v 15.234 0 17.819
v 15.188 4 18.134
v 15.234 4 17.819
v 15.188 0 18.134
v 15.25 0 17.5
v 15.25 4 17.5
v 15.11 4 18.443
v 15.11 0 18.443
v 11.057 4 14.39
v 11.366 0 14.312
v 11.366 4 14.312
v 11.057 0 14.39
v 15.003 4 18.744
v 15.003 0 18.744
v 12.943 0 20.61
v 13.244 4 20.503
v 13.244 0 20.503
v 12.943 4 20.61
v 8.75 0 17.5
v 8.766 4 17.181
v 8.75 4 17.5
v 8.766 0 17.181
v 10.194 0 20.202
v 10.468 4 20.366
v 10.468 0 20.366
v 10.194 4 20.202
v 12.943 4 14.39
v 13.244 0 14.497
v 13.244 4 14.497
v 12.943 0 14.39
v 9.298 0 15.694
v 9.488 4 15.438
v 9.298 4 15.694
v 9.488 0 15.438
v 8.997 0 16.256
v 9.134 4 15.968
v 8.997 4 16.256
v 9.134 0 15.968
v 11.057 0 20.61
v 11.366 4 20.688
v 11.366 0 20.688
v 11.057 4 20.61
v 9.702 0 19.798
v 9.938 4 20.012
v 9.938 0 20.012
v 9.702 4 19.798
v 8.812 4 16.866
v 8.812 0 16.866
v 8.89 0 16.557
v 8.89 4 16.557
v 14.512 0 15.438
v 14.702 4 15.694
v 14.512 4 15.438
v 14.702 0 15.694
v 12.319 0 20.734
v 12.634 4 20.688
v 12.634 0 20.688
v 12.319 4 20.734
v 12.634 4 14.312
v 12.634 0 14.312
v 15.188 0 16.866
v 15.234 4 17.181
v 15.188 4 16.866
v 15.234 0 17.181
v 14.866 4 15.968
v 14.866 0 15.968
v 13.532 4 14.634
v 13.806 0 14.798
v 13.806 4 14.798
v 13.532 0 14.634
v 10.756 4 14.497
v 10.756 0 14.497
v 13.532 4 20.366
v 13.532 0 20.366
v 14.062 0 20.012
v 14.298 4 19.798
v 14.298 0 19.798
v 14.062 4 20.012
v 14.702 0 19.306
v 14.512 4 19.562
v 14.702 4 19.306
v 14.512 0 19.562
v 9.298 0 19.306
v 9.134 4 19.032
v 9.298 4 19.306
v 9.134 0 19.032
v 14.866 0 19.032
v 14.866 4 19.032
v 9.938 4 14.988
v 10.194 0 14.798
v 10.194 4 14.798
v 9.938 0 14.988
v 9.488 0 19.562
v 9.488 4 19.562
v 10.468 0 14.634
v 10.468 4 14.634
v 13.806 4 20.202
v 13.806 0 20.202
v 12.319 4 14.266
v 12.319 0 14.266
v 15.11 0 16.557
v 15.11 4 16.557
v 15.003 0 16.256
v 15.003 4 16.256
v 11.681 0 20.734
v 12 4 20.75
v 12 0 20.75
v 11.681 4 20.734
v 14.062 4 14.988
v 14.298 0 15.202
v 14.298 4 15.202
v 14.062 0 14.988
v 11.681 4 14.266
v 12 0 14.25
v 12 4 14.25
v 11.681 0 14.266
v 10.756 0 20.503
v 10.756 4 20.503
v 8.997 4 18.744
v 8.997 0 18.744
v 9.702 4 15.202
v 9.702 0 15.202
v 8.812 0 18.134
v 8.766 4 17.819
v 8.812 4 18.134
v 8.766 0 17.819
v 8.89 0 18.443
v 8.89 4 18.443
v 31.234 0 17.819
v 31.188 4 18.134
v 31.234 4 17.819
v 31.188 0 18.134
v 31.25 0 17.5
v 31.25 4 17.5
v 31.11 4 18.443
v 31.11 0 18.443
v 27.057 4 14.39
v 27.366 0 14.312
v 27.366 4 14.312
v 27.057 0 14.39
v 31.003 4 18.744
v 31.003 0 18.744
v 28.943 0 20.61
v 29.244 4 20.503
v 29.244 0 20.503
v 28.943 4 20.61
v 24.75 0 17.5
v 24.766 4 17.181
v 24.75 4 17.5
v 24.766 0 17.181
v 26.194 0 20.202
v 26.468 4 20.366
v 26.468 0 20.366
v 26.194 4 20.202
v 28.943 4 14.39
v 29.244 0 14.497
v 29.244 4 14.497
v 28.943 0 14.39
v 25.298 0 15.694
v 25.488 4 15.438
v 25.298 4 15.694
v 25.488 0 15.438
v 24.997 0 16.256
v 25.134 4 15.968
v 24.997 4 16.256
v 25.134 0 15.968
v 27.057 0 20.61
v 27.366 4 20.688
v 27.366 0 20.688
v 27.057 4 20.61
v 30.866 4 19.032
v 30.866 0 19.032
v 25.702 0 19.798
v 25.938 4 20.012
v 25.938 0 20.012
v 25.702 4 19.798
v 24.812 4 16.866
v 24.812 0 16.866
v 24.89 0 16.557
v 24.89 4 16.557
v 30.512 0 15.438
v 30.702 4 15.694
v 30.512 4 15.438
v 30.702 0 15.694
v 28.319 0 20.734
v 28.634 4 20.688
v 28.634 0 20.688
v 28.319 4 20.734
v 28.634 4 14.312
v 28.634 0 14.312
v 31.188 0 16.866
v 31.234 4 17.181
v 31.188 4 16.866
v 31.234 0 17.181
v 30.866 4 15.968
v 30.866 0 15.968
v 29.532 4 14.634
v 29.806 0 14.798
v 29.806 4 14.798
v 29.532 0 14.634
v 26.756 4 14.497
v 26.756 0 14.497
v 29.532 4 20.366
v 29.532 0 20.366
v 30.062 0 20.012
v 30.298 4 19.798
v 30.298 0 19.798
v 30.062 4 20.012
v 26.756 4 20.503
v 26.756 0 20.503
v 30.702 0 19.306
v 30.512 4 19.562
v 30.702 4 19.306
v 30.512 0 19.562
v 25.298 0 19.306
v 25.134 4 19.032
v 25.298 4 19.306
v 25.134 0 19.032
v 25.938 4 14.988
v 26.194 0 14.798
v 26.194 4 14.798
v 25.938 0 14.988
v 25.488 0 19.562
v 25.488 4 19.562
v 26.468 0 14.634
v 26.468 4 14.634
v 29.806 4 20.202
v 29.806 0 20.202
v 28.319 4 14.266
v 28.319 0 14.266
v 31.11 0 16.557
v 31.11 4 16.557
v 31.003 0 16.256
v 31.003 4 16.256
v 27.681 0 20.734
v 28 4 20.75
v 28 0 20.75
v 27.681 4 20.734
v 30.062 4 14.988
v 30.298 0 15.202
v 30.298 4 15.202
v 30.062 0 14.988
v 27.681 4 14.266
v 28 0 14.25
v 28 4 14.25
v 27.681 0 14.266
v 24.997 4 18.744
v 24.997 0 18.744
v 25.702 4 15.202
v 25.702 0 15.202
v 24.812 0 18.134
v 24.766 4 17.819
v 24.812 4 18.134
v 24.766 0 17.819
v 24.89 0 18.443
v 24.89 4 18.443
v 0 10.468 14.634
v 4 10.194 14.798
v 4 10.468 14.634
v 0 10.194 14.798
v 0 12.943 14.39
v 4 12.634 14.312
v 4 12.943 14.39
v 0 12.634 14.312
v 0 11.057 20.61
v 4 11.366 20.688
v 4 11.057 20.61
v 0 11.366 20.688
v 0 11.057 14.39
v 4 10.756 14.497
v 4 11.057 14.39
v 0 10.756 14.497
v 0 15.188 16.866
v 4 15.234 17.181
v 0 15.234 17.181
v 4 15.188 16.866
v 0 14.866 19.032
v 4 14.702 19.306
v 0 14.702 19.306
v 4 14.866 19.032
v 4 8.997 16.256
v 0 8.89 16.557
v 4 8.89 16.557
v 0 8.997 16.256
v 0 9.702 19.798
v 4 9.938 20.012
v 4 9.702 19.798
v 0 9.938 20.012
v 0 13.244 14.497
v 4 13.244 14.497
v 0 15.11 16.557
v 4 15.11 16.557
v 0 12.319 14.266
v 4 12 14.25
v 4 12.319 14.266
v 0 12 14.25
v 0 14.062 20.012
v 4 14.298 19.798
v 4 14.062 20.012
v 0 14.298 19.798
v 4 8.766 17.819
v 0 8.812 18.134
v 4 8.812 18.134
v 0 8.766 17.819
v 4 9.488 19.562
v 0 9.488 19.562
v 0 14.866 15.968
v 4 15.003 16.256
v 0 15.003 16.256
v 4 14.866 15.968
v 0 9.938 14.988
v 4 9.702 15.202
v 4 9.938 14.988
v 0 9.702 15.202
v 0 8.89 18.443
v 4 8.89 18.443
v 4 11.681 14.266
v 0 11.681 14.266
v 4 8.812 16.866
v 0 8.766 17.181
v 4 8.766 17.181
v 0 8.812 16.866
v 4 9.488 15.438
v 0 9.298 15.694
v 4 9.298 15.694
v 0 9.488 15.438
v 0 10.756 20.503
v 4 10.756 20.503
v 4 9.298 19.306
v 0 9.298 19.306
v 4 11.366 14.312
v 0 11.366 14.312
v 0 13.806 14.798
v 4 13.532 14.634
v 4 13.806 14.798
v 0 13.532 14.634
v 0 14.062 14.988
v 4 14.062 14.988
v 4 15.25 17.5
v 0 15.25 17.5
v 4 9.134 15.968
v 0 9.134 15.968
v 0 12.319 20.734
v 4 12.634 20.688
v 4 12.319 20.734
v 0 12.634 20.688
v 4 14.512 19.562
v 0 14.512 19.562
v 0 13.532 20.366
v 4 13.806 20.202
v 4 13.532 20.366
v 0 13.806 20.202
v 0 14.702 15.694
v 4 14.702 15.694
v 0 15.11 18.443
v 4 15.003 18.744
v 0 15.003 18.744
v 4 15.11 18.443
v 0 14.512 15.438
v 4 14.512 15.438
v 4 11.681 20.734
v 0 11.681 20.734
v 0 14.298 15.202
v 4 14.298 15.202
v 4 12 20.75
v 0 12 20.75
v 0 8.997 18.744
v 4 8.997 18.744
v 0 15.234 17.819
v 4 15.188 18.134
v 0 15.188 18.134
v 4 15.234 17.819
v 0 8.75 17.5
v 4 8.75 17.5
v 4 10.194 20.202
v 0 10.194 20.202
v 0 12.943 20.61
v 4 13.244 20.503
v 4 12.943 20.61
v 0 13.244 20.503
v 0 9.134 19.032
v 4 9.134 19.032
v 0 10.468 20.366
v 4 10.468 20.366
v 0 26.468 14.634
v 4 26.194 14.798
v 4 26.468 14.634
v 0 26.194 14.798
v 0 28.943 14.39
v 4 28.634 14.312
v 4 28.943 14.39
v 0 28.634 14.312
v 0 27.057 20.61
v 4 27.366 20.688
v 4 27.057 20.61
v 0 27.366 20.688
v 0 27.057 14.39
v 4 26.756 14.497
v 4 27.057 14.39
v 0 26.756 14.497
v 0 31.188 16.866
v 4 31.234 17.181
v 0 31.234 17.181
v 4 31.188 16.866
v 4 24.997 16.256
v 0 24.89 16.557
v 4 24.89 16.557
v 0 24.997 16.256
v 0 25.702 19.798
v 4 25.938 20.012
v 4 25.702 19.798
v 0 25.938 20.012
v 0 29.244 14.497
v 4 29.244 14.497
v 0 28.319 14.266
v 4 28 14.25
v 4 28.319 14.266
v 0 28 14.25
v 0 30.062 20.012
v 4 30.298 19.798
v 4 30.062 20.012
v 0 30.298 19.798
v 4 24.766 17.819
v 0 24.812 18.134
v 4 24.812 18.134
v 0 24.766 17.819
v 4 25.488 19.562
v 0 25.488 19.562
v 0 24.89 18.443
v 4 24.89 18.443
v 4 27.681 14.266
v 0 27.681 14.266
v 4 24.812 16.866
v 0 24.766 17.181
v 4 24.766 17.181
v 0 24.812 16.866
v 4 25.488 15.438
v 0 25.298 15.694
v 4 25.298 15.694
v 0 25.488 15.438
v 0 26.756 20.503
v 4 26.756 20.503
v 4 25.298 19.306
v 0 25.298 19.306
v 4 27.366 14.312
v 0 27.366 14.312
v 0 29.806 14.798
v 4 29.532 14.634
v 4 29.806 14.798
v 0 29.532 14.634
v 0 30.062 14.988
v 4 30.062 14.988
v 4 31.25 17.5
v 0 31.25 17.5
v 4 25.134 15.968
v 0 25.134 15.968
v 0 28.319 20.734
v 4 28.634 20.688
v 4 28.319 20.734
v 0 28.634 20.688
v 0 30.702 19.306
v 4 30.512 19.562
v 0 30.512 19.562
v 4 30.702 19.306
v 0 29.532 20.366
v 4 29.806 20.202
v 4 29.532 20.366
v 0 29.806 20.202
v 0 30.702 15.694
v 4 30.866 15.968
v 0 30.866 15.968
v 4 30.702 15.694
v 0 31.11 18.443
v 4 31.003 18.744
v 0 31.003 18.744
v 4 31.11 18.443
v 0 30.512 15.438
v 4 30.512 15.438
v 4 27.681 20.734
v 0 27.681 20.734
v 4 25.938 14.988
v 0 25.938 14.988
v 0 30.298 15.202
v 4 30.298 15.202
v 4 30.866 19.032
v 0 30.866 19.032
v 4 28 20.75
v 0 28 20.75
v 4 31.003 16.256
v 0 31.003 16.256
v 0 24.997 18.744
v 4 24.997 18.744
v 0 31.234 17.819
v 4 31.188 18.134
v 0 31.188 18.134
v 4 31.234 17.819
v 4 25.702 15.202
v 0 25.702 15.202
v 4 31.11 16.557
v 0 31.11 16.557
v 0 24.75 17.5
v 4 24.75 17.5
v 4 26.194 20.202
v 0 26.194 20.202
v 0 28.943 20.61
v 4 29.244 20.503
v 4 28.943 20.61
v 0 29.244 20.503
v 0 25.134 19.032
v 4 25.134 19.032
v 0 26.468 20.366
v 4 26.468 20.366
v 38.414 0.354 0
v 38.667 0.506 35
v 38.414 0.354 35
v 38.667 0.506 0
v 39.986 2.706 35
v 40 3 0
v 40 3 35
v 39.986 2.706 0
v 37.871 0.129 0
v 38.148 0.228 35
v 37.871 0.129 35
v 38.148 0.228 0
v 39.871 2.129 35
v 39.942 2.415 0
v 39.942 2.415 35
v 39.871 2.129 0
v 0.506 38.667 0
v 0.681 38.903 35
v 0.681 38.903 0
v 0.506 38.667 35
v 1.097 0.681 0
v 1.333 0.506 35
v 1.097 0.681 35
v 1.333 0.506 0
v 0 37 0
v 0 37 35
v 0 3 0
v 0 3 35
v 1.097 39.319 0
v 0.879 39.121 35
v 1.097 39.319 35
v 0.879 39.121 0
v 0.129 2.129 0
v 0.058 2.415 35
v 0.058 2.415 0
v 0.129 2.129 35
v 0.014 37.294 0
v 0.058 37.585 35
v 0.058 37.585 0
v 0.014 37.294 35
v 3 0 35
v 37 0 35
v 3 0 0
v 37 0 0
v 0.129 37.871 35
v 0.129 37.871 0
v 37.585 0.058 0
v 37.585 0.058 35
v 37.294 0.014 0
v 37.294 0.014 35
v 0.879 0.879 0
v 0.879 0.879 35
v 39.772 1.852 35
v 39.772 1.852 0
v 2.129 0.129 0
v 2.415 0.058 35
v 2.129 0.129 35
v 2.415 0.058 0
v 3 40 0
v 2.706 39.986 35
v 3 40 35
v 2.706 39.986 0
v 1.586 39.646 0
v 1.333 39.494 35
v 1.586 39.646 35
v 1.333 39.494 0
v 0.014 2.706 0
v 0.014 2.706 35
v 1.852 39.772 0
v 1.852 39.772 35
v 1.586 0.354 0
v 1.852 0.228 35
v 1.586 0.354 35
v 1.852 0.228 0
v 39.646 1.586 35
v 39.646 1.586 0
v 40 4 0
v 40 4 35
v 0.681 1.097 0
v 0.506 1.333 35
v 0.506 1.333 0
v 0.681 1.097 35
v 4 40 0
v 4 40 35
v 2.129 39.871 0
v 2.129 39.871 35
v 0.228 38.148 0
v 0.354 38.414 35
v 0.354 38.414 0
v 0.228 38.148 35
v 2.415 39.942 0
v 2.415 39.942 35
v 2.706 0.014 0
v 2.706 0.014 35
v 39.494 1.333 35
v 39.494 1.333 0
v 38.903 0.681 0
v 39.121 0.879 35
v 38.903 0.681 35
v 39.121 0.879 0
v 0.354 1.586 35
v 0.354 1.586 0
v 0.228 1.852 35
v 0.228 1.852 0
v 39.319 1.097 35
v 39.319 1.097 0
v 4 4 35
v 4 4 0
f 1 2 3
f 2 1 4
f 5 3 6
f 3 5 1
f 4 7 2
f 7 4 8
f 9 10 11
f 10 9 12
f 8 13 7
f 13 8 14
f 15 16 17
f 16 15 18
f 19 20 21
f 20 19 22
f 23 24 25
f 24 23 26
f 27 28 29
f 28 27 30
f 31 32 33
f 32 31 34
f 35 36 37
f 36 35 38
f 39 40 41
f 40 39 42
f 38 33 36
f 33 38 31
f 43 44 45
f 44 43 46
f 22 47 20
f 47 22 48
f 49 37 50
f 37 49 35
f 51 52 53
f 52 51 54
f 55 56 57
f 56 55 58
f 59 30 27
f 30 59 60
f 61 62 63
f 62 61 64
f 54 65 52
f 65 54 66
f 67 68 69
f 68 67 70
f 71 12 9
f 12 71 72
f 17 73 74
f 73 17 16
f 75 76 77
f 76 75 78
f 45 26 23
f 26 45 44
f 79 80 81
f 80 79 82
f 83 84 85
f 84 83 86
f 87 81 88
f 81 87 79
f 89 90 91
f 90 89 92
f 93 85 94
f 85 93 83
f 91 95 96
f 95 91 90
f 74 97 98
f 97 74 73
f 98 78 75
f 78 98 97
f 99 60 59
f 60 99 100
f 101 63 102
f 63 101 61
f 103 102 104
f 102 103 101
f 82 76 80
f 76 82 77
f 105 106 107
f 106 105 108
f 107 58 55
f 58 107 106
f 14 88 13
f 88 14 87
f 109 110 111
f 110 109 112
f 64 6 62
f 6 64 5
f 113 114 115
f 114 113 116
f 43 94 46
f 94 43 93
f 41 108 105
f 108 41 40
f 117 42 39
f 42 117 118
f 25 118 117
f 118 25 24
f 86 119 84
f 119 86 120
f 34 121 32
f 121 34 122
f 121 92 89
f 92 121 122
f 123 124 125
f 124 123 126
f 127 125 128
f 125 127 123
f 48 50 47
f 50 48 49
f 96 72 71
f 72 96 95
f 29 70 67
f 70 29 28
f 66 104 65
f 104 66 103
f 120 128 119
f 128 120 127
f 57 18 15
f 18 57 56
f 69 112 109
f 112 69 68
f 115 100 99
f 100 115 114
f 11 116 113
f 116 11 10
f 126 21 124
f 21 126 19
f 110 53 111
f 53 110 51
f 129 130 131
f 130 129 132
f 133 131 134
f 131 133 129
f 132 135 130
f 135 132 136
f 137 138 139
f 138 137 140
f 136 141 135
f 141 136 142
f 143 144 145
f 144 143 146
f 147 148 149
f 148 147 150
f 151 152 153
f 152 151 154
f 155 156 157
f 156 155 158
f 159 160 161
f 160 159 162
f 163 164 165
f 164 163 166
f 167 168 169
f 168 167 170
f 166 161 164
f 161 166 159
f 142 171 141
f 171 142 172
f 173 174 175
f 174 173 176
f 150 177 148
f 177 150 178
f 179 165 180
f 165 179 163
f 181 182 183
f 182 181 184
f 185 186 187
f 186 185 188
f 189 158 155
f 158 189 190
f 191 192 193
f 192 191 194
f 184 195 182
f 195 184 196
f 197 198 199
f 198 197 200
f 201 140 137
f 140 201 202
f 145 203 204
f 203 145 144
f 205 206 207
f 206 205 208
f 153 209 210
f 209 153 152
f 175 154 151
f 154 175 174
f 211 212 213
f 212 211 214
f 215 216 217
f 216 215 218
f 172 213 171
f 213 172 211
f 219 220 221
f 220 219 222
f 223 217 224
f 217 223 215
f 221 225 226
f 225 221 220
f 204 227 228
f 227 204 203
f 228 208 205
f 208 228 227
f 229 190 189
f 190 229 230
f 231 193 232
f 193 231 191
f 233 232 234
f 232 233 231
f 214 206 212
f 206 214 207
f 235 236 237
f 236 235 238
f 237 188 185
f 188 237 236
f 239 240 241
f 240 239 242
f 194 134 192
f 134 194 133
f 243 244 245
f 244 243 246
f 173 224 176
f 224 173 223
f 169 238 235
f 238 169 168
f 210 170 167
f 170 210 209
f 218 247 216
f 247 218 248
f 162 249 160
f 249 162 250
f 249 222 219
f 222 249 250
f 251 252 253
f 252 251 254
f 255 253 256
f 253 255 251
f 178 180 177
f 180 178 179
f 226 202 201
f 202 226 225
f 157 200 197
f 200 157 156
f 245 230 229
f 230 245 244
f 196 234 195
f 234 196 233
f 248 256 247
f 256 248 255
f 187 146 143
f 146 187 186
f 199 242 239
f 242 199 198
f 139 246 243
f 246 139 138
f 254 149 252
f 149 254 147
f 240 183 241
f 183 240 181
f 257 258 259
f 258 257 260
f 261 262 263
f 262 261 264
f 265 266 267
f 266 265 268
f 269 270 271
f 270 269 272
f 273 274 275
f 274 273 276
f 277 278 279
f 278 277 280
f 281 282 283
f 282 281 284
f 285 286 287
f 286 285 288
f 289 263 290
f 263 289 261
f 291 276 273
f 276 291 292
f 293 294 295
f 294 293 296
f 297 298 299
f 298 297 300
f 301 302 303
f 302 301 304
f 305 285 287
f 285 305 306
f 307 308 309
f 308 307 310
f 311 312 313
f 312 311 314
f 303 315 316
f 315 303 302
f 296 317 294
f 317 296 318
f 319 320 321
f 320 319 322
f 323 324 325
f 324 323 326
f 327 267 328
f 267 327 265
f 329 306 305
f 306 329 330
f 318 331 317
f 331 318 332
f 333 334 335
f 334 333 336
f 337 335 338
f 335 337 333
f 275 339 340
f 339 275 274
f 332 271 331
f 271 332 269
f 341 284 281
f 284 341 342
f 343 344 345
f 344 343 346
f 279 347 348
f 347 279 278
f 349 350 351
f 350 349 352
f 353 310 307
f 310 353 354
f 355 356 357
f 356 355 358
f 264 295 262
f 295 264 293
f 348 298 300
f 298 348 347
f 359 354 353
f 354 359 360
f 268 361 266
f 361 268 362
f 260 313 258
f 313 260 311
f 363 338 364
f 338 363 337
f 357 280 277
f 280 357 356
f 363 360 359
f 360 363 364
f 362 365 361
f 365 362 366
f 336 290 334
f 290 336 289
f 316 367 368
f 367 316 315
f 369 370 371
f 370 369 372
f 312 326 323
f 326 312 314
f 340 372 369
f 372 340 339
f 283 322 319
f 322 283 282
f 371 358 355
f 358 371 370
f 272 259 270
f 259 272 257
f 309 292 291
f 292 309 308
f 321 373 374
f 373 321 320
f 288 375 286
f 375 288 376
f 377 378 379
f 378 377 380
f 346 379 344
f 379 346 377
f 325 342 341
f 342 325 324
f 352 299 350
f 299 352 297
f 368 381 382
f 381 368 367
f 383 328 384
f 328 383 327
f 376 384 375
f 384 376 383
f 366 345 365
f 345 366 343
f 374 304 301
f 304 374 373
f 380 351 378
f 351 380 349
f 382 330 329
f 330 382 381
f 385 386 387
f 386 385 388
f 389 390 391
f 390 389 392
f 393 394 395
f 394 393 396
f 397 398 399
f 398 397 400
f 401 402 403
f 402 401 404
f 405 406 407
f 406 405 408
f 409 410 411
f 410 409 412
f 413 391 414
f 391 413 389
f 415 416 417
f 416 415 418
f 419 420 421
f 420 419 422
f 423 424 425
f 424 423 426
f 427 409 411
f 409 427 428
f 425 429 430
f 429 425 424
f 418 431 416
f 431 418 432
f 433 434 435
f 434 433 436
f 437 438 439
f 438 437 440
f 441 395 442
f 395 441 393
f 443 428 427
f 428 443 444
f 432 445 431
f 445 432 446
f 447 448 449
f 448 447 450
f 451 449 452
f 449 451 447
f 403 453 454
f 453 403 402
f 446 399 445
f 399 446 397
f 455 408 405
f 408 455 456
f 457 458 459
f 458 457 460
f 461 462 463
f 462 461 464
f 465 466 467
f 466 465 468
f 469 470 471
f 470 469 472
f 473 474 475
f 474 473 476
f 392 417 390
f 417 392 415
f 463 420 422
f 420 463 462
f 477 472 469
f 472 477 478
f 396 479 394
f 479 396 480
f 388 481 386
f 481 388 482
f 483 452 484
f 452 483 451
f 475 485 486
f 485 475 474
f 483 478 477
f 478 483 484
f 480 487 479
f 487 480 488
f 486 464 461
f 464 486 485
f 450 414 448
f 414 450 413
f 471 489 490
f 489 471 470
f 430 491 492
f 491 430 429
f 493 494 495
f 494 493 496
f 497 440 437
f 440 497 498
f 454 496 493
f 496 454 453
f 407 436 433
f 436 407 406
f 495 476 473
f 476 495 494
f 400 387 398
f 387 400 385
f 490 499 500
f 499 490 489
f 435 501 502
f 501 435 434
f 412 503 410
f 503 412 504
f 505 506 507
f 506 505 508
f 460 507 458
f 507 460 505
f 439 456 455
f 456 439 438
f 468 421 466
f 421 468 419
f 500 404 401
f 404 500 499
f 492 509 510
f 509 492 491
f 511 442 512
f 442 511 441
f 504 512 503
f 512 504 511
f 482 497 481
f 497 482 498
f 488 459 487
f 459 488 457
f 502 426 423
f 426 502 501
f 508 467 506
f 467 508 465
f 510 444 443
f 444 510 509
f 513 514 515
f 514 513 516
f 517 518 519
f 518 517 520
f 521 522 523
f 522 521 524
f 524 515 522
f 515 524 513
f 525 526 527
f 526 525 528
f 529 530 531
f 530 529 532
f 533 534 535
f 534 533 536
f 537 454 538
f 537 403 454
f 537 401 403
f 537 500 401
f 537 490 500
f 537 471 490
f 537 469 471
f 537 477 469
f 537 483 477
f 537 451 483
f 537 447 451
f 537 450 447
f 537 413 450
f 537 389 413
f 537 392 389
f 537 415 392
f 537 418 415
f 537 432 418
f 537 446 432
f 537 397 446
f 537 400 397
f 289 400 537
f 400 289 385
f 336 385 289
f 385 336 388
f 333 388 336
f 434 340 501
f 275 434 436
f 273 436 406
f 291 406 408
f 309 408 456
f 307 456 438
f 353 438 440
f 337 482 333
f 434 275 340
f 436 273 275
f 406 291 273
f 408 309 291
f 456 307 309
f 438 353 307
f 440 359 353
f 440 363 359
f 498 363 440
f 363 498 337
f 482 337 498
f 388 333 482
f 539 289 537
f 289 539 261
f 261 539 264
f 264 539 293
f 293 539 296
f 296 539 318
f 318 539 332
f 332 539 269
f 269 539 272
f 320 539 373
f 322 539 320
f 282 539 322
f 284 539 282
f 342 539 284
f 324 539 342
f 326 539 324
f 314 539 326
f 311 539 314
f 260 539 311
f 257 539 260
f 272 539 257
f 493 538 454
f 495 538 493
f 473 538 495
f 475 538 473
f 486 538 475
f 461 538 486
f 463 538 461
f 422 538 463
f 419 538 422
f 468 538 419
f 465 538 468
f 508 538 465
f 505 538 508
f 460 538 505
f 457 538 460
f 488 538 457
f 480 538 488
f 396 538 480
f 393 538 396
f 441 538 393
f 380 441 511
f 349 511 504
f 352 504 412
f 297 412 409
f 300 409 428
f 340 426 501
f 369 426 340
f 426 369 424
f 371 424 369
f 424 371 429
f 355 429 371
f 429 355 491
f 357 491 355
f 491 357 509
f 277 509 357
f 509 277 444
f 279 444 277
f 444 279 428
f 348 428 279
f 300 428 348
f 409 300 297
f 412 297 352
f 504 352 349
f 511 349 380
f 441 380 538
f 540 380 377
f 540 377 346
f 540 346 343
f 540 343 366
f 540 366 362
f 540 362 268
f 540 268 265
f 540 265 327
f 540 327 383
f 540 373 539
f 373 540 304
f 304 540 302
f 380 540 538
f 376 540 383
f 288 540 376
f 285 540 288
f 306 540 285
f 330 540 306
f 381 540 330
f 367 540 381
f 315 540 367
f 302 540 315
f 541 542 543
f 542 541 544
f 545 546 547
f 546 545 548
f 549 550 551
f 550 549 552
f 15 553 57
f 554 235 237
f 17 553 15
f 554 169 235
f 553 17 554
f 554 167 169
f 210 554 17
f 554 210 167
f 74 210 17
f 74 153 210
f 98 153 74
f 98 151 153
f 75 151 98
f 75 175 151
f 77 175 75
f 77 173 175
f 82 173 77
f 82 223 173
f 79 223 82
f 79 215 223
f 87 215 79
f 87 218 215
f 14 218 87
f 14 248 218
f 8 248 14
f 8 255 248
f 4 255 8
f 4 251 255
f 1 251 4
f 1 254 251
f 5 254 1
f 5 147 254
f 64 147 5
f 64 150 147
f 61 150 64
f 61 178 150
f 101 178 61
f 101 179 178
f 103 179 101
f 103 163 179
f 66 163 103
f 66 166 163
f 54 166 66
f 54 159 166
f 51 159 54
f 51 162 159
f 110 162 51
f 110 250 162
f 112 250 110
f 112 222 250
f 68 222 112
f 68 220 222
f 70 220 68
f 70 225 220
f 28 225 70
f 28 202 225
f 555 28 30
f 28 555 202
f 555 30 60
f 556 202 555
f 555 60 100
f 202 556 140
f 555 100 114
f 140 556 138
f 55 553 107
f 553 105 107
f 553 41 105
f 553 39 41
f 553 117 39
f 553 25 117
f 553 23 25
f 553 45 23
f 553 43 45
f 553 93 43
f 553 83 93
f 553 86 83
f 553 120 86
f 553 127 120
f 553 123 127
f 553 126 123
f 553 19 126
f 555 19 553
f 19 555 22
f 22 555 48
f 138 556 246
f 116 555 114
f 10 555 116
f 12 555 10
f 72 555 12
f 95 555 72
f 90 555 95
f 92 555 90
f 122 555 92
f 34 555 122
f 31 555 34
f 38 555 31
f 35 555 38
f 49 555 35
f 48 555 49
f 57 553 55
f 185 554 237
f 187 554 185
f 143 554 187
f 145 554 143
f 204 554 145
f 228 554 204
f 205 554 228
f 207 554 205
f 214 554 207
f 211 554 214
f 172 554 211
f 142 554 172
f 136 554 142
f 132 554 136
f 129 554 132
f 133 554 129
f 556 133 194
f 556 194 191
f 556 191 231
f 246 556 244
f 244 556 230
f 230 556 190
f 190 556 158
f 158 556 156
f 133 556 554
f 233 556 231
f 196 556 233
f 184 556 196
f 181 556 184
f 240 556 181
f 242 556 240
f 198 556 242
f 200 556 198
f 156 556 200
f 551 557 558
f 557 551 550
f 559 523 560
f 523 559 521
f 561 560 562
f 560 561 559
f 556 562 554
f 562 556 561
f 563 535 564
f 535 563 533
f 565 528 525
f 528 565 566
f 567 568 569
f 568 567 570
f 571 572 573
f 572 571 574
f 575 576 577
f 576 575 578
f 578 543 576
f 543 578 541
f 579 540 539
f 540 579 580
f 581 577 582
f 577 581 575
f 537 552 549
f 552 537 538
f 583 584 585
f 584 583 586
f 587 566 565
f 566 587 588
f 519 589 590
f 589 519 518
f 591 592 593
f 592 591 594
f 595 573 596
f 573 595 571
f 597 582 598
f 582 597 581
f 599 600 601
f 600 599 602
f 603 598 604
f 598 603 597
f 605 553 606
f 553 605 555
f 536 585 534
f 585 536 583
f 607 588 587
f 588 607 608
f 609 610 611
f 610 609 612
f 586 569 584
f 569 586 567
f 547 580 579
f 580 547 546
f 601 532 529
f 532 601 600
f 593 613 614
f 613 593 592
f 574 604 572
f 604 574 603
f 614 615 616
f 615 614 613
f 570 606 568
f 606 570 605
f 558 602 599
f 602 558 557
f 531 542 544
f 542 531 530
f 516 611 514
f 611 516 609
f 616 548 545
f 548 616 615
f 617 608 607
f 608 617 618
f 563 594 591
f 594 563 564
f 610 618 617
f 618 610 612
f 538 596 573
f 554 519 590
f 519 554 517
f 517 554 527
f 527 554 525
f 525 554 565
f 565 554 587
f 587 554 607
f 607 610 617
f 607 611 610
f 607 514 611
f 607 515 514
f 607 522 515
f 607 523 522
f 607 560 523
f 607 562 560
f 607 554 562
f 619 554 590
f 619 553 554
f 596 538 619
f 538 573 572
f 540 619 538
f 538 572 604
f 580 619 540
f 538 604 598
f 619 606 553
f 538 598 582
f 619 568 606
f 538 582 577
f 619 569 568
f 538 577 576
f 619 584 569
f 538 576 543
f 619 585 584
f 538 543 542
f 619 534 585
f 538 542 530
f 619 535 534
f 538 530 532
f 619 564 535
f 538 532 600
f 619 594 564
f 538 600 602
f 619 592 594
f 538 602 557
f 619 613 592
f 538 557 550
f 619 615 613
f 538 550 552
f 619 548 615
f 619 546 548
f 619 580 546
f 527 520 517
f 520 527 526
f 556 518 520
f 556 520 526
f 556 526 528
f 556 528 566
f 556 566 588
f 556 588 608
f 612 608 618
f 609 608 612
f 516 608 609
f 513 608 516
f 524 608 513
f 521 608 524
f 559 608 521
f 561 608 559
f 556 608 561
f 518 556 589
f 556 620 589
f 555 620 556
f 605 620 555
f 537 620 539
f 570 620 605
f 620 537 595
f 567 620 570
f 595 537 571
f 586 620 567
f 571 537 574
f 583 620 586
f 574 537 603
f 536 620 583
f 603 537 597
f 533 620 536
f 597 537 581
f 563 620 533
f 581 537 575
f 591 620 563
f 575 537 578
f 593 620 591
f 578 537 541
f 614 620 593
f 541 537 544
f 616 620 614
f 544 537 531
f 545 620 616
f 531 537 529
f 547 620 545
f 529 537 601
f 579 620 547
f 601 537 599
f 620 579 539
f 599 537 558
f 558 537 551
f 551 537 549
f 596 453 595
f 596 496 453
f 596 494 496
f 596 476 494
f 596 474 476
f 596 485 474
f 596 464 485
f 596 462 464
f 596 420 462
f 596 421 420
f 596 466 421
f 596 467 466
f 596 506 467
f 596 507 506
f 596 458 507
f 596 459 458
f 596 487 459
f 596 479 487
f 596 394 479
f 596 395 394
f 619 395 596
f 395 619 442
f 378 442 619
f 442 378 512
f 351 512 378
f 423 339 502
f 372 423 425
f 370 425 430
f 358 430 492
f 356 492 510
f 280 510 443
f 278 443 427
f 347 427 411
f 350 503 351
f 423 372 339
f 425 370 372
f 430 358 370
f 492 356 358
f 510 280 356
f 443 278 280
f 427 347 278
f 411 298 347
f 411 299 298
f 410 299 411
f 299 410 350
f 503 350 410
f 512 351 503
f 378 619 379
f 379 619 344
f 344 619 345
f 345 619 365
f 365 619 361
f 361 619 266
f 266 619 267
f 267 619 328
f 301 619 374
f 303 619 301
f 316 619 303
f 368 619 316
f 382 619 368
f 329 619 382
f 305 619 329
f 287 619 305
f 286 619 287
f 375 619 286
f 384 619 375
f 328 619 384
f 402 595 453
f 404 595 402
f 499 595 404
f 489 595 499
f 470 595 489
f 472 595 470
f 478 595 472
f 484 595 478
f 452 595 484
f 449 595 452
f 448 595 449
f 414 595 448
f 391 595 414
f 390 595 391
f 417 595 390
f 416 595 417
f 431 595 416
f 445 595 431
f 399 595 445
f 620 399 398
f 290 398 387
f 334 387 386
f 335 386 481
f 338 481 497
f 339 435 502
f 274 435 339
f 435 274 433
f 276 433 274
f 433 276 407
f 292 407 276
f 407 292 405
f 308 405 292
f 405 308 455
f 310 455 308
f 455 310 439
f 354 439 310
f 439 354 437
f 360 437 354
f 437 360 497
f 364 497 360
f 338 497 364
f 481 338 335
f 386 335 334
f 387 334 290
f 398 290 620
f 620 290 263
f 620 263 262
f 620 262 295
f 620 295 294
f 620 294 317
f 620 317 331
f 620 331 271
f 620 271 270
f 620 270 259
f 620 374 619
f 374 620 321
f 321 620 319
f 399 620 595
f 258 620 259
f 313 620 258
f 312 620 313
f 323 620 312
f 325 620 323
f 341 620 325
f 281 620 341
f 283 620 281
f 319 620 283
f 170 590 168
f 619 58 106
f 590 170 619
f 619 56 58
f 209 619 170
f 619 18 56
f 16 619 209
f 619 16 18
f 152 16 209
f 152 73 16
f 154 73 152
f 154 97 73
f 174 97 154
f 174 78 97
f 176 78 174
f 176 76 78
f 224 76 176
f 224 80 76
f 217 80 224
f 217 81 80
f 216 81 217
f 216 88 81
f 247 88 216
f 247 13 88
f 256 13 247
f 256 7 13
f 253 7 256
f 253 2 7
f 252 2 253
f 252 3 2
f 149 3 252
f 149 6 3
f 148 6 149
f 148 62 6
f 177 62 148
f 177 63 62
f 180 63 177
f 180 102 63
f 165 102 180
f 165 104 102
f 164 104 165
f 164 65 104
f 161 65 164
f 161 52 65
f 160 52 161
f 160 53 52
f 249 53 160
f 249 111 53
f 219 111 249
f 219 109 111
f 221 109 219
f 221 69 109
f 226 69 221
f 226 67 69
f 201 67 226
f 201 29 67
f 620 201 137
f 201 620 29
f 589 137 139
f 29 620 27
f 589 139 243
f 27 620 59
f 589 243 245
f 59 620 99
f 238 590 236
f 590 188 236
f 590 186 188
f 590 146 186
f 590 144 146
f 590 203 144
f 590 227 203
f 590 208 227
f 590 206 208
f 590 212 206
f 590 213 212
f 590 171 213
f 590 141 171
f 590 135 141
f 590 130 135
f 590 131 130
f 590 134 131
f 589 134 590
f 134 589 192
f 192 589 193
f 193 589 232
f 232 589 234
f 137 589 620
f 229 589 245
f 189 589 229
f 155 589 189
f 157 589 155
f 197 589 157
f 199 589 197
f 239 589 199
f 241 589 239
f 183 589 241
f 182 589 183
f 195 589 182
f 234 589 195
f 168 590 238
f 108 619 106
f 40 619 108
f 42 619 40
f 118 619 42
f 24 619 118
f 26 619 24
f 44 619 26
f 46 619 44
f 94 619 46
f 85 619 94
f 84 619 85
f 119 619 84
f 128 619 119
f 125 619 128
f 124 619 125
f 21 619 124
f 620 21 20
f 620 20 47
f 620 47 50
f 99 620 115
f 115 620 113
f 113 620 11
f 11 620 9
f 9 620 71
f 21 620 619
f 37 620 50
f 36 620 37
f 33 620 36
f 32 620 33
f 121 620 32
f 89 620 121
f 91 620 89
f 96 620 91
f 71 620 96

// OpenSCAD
$fn = 64;

size = [40, 40, 35];   // overall bounding box [X,Y,Z]
wall = 4;              // bracket wall thickness
hole_d = 6.5;          // mounting hole diameter
hole_edge = 12;        // distance from outer edges to hole centers
fillet_r = 3;          // outer corner rounding

module rounded_box(sz=[10,10,10], r=2){
    r2 = min(r, sz[0]/2, sz[1]/2);
    linear_extrude(height=sz[2])
        offset(r=r2)
            square([sz[0]-2*r2, sz[1]-2*r2], center=true);
}

module extrusion_bracket(sz=[40,40,35], t=4, hd=6.5, he=12, fr=3){
    difference(){
        // Outer L-bracket volume (rounded)
        translate([sz[0]/2, sz[1]/2, 0])
            rounded_box([sz[0], sz[1], sz[2]], r=fr);

        // Remove inner corner to form L shape
        translate([t, t, -0.5])
            cube([sz[0]-t+0.5, sz[1]-t+0.5, sz[2]+1], center=false);

        // Holes on X-leg (along Y thickness)
        for (x = [he, sz[0]-he])
            translate([x, t/2, sz[2]/2])
                rotate([90,0,0])
                    cylinder(d=hd, h=t+1, center=true);

        // Holes on Y-leg (along X thickness)
        for (y = [he, sz[1]-he])
            translate([t/2, y, sz[2]/2])
                rotate([0,90,0])
                    cylinder(d=hd, h=t+1, center=true);
    }
}

extrusion_bracket(size, wall, hole_d, hole_edge, fillet_r);
